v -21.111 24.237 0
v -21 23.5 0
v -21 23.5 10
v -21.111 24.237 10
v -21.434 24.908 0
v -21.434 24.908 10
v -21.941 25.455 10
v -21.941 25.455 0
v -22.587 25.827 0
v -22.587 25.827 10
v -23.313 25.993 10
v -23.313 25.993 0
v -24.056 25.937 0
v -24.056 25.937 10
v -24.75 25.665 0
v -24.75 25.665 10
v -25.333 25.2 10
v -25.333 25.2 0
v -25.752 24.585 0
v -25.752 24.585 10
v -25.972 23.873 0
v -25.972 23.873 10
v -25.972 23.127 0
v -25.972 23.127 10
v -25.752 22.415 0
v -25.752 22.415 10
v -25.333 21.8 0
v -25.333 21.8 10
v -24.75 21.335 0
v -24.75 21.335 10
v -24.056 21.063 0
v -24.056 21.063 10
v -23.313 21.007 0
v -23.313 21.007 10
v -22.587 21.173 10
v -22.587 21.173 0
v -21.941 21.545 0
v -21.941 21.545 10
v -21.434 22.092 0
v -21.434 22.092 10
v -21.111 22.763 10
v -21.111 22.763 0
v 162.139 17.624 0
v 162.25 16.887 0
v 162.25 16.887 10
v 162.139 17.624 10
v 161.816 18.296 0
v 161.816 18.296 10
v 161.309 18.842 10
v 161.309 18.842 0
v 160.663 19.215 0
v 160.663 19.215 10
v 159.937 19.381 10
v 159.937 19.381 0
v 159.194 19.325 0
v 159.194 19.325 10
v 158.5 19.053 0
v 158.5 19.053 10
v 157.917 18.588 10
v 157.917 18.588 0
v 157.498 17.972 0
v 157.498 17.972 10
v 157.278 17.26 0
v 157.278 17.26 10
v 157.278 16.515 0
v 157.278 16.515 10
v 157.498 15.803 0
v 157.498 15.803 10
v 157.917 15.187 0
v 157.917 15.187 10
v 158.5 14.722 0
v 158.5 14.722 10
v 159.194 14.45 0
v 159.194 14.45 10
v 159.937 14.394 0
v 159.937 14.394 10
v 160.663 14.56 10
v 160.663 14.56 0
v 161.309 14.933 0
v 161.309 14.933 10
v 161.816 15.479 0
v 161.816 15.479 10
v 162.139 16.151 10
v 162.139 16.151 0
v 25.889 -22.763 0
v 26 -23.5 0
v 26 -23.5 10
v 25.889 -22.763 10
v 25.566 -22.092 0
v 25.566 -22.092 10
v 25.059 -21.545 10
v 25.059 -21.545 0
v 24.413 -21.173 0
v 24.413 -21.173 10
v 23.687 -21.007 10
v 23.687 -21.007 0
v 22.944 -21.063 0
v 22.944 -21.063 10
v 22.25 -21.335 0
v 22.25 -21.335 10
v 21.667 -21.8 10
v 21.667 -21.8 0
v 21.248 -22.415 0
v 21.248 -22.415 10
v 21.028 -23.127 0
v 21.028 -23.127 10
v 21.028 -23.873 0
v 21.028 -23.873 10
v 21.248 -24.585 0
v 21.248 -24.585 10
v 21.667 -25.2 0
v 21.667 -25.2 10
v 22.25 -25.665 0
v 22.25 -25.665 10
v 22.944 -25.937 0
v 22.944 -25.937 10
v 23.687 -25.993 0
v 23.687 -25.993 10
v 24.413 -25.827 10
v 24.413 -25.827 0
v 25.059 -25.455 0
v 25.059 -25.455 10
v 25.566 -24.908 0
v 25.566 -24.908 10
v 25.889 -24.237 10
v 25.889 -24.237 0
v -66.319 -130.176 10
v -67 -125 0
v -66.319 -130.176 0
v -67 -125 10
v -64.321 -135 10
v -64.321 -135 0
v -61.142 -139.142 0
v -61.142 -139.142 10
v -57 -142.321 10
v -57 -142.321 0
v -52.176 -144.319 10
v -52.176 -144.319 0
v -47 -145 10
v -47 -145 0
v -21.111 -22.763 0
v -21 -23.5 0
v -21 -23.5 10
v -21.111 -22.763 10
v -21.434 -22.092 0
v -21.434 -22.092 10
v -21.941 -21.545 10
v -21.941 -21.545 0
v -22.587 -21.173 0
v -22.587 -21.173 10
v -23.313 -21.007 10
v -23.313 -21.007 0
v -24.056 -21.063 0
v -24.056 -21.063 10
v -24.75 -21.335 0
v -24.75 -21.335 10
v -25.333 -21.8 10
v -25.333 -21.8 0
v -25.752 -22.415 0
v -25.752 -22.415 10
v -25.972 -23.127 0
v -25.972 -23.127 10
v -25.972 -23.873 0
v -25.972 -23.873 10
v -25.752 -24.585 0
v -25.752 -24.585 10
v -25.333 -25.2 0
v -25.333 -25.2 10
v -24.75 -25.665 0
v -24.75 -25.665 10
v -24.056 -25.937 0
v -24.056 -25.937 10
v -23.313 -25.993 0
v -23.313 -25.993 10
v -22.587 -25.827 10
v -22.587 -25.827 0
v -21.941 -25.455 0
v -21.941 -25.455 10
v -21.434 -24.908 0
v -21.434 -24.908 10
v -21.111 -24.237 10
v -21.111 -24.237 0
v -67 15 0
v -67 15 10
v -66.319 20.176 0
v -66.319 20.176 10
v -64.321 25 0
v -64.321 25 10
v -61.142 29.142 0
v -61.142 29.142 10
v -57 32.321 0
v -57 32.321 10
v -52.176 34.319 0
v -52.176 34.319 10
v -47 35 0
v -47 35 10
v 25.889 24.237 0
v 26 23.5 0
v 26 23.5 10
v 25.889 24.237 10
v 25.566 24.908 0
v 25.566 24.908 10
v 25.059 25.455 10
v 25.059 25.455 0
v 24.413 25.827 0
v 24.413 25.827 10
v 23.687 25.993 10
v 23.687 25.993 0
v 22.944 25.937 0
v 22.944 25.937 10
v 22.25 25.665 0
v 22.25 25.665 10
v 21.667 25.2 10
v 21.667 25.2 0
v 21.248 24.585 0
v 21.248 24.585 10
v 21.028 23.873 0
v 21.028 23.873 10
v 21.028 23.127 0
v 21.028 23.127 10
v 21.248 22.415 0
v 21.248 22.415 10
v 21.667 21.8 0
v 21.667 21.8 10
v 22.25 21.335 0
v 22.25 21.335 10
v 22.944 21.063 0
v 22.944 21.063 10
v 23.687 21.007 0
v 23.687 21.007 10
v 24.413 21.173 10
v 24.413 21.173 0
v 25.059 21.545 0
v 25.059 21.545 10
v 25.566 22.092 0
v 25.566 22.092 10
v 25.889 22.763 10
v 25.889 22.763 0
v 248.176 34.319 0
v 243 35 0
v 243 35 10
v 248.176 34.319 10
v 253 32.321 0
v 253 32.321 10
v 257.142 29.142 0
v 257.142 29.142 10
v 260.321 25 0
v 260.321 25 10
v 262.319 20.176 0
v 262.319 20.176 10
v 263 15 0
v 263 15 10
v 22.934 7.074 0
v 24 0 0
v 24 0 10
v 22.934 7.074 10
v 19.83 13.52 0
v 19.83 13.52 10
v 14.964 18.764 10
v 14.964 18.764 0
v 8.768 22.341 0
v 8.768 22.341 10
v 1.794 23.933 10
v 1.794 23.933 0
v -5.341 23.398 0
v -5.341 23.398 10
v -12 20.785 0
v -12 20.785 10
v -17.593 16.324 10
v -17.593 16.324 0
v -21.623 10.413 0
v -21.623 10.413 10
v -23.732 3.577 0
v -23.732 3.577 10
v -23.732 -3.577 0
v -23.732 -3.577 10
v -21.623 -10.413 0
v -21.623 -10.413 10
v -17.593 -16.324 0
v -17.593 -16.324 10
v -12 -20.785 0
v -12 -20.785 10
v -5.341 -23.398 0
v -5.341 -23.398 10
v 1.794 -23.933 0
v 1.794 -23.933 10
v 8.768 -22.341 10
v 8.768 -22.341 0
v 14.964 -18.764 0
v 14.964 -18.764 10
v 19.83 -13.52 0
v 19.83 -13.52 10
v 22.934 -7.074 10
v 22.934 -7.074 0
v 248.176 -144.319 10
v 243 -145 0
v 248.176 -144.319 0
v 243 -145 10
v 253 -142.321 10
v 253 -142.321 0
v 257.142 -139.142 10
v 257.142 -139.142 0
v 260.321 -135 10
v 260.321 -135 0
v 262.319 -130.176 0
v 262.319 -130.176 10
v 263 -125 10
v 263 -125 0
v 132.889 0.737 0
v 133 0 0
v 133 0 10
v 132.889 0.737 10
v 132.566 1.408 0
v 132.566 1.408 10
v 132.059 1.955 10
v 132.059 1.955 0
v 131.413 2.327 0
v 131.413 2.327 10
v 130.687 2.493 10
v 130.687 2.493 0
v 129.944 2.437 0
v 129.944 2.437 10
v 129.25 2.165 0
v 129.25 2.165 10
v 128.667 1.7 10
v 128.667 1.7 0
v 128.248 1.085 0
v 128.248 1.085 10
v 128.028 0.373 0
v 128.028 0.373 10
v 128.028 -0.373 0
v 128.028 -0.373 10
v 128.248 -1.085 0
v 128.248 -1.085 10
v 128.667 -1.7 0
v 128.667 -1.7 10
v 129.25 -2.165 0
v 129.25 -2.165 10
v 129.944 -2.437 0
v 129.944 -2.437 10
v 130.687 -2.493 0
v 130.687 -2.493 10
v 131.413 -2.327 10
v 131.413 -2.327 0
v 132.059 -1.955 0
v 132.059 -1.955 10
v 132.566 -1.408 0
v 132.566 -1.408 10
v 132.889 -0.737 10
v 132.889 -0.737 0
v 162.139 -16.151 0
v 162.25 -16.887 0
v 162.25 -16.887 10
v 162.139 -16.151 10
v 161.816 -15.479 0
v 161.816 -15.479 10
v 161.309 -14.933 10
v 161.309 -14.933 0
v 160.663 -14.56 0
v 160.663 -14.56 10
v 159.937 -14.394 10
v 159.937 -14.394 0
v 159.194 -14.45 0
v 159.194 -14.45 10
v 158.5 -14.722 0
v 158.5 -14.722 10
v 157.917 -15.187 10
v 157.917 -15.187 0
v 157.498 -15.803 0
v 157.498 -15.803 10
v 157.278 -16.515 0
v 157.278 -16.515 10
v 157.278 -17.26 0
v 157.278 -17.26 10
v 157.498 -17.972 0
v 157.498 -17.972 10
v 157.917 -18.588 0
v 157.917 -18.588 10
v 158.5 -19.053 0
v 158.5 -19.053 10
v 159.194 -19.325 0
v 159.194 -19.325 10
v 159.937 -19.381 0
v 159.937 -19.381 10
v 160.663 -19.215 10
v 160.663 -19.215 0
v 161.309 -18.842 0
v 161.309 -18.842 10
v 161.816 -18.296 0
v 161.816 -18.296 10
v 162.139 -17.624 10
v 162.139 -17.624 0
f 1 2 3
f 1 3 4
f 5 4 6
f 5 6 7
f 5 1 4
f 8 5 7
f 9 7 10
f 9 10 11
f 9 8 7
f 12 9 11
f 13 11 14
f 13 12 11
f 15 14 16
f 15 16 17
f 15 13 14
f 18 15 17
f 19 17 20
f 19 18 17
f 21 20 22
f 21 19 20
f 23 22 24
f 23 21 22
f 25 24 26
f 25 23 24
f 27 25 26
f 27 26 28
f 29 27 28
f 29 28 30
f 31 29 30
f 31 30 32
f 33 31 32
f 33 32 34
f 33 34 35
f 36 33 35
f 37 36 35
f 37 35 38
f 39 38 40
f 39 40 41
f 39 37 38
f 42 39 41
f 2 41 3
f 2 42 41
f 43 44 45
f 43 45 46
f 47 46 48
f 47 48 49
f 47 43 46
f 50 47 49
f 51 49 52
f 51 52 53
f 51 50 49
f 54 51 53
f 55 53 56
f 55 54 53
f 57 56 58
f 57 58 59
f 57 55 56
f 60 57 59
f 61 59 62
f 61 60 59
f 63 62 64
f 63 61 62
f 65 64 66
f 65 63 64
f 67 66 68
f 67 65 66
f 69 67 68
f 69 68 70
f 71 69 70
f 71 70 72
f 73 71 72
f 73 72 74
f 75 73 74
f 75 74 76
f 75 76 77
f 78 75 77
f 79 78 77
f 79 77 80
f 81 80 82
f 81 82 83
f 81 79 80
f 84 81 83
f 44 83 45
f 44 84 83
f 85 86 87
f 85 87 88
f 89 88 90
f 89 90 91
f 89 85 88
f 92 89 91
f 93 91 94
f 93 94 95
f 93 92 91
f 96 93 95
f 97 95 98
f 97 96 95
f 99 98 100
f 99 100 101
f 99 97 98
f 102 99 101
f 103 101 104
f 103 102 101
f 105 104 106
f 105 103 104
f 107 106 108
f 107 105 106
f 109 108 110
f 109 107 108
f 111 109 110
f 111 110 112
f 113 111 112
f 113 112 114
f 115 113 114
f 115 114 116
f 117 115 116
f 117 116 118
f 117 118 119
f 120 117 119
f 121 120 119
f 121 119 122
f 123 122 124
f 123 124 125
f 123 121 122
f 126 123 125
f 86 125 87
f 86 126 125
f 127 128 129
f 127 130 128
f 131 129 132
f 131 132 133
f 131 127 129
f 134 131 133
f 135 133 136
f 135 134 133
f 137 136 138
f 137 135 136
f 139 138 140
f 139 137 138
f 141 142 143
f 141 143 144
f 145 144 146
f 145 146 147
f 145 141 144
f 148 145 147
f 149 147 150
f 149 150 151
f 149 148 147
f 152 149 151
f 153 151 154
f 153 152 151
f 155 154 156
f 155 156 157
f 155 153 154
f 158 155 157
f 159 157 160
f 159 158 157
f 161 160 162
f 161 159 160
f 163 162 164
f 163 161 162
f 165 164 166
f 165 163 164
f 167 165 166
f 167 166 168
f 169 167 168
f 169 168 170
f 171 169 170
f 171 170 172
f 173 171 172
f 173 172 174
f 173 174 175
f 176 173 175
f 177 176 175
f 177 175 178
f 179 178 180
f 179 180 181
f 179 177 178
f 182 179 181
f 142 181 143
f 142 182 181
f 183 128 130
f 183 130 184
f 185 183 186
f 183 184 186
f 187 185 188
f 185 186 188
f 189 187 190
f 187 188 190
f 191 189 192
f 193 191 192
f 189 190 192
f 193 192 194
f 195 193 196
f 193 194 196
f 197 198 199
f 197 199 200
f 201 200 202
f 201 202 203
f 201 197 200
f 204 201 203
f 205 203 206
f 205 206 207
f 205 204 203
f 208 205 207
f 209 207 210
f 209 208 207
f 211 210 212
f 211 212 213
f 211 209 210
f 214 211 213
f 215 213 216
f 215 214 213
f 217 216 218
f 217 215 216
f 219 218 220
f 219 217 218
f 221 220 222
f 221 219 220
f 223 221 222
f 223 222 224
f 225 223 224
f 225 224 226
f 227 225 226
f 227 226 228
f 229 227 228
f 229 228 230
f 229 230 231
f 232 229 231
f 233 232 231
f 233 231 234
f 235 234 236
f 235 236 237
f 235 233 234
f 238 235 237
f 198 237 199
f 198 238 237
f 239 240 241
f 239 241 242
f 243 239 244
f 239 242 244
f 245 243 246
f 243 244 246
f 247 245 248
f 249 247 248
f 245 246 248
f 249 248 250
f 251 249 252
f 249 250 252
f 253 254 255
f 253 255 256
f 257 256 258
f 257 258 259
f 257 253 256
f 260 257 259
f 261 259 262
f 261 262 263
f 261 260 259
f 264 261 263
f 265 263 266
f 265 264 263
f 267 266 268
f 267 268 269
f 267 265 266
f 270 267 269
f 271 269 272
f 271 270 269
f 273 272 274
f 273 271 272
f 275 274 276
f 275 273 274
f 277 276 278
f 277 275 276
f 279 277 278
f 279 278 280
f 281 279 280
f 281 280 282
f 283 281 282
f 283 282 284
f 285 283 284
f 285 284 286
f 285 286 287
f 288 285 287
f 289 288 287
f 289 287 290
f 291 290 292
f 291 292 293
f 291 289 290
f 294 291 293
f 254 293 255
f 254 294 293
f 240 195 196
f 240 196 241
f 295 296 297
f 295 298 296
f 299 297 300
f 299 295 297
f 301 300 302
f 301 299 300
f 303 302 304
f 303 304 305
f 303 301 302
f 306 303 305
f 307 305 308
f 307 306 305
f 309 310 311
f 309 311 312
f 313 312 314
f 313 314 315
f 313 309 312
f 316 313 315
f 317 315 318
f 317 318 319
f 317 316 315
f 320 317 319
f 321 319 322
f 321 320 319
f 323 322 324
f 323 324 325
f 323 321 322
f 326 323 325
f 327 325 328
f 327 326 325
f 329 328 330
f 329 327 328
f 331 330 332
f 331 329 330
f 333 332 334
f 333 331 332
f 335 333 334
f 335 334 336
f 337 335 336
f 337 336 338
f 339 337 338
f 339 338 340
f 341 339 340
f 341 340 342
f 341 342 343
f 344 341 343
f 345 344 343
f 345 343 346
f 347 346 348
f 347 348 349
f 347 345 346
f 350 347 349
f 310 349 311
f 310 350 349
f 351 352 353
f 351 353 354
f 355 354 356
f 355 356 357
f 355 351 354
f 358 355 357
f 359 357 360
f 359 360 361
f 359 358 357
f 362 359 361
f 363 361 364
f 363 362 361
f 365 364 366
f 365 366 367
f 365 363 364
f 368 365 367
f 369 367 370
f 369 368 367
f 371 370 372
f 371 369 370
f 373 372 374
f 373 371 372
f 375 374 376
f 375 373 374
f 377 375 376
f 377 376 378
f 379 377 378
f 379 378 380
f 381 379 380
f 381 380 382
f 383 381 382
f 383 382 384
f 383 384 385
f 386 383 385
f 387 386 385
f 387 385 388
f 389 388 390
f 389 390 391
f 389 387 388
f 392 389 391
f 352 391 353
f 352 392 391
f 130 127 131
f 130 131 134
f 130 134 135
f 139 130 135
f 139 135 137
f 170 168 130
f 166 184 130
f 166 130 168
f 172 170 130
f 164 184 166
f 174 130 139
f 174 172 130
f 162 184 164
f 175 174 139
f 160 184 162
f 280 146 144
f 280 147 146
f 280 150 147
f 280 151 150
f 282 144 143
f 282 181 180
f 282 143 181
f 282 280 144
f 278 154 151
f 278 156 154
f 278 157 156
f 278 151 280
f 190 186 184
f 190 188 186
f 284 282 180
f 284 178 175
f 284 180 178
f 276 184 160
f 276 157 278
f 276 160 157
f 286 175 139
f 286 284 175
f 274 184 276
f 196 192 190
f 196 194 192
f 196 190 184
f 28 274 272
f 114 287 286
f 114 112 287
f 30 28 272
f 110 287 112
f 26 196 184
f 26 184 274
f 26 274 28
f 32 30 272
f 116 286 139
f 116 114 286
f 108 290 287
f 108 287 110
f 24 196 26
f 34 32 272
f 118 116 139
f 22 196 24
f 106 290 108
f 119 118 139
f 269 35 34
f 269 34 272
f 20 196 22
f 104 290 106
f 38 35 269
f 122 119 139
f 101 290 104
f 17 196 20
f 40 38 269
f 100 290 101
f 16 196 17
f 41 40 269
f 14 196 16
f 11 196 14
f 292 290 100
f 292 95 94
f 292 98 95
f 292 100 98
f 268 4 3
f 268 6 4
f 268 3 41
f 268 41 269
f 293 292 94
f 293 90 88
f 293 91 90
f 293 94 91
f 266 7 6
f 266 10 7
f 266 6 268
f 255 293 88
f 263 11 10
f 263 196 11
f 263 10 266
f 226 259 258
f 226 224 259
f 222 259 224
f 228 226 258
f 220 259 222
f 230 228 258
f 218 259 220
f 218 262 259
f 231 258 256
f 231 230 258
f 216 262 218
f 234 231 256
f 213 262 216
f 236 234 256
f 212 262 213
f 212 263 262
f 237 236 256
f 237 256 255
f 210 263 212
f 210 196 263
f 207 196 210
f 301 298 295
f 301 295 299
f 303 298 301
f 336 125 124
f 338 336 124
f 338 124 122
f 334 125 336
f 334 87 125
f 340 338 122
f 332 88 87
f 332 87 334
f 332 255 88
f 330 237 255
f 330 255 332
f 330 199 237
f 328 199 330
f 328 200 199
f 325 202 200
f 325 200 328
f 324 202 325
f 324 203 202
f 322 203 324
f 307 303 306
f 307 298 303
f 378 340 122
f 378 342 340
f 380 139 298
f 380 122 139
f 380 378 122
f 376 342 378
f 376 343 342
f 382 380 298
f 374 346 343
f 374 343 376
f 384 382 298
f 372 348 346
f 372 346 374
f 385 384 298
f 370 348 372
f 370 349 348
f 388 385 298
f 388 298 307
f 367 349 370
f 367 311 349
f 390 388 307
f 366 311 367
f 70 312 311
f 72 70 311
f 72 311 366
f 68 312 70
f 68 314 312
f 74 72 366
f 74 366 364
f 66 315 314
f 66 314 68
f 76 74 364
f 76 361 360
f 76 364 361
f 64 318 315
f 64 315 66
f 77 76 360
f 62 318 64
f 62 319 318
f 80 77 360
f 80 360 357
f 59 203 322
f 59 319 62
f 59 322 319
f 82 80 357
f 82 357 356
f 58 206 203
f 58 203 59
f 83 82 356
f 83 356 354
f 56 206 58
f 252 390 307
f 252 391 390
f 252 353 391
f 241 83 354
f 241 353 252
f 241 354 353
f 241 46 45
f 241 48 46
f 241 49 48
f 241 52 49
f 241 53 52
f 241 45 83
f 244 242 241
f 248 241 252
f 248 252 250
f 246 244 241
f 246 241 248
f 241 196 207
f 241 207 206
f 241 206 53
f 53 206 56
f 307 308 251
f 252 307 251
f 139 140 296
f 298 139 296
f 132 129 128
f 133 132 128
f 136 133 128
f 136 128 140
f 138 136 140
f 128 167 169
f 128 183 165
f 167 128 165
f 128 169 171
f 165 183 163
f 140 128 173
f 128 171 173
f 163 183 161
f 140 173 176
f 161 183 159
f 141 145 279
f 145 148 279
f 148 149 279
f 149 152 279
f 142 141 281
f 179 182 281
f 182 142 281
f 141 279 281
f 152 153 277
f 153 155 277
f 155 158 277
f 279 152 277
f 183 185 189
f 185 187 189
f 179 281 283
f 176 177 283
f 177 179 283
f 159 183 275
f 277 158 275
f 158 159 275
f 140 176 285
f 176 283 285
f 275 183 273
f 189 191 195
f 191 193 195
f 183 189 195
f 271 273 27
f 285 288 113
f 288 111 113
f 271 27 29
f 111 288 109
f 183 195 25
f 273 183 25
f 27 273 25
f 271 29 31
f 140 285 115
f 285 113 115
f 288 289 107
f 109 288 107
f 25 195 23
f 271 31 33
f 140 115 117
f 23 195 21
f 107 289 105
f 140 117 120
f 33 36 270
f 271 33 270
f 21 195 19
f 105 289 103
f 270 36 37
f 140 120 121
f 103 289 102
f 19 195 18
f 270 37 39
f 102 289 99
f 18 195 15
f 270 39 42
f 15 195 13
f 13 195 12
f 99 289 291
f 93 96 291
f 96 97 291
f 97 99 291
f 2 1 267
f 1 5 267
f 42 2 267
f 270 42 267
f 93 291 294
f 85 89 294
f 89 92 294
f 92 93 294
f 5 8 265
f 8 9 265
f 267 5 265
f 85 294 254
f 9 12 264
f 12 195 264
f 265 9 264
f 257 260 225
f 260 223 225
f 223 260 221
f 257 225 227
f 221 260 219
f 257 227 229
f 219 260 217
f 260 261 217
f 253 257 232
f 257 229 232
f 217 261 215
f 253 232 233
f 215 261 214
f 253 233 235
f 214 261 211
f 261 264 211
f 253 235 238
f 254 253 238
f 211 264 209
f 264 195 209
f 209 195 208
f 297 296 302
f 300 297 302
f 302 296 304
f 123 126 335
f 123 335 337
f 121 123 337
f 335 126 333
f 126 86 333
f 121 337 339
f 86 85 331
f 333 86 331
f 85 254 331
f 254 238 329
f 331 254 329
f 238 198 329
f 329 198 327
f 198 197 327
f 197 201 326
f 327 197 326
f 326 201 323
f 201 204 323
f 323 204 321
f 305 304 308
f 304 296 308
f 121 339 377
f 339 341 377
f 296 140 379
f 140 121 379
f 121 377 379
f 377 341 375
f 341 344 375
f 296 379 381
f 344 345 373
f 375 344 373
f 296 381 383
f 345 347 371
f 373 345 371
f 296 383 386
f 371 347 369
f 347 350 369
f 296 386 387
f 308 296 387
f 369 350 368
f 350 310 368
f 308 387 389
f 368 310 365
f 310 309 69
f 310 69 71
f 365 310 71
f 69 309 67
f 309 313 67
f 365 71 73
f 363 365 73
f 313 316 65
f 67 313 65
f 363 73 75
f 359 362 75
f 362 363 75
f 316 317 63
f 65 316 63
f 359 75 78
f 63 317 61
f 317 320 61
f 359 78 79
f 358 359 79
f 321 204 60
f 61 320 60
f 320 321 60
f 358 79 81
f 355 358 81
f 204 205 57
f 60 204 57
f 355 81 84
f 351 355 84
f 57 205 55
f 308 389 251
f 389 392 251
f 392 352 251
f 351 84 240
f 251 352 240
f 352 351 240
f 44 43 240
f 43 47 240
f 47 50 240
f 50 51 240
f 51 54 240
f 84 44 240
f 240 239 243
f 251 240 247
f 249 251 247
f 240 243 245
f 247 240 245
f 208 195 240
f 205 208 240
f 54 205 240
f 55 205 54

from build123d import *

# Parameters (mm, degrees)
SKETCH_W   = 330
SKETCH_H   = 180
SKETCH_R   = 2.5
SKETCH_R_2 = 24
PAD_DEPTH  = 10
FILLET_R   = 20


with BuildPart() as part:
    # Sketch → Pad (new body)
    with BuildSketch(Plane.XY):
        with Locations((98, -55)):
            Rectangle(SKETCH_W, SKETCH_H)
        with Locations((23.5, 23.5)):
            Circle(SKETCH_R, mode=Mode.SUBTRACT)
        with Locations((-23.5, 23.5)):
            Circle(SKETCH_R, mode=Mode.SUBTRACT)
        with Locations((-23.5, -23.5)):
            Circle(SKETCH_R, mode=Mode.SUBTRACT)
        with Locations((23.5, -23.5)):
            Circle(SKETCH_R, mode=Mode.SUBTRACT)
        Circle(SKETCH_R_2, mode=Mode.SUBTRACT)
        with Locations((159.75, 16.887495)):
            Circle(SKETCH_R, mode=Mode.SUBTRACT)
        with Locations((130.5, 0)):
            Circle(SKETCH_R, mode=Mode.SUBTRACT)
        with Locations((159.75, -16.887495)):
            Circle(SKETCH_R, mode=Mode.SUBTRACT)
    extrude(amount=PAD_DEPTH)

    # Fillet
    fillet_edges = [part.edges().sort_by_distance(p)[0] for p in [
        (-67, -145, 5),
        (263, -145, 5),
        (263, 35, 5),
        (-67, 35, 5),
    ]]
    fillet(fillet_edges, radius=FILLET_R)


solid = part.part
